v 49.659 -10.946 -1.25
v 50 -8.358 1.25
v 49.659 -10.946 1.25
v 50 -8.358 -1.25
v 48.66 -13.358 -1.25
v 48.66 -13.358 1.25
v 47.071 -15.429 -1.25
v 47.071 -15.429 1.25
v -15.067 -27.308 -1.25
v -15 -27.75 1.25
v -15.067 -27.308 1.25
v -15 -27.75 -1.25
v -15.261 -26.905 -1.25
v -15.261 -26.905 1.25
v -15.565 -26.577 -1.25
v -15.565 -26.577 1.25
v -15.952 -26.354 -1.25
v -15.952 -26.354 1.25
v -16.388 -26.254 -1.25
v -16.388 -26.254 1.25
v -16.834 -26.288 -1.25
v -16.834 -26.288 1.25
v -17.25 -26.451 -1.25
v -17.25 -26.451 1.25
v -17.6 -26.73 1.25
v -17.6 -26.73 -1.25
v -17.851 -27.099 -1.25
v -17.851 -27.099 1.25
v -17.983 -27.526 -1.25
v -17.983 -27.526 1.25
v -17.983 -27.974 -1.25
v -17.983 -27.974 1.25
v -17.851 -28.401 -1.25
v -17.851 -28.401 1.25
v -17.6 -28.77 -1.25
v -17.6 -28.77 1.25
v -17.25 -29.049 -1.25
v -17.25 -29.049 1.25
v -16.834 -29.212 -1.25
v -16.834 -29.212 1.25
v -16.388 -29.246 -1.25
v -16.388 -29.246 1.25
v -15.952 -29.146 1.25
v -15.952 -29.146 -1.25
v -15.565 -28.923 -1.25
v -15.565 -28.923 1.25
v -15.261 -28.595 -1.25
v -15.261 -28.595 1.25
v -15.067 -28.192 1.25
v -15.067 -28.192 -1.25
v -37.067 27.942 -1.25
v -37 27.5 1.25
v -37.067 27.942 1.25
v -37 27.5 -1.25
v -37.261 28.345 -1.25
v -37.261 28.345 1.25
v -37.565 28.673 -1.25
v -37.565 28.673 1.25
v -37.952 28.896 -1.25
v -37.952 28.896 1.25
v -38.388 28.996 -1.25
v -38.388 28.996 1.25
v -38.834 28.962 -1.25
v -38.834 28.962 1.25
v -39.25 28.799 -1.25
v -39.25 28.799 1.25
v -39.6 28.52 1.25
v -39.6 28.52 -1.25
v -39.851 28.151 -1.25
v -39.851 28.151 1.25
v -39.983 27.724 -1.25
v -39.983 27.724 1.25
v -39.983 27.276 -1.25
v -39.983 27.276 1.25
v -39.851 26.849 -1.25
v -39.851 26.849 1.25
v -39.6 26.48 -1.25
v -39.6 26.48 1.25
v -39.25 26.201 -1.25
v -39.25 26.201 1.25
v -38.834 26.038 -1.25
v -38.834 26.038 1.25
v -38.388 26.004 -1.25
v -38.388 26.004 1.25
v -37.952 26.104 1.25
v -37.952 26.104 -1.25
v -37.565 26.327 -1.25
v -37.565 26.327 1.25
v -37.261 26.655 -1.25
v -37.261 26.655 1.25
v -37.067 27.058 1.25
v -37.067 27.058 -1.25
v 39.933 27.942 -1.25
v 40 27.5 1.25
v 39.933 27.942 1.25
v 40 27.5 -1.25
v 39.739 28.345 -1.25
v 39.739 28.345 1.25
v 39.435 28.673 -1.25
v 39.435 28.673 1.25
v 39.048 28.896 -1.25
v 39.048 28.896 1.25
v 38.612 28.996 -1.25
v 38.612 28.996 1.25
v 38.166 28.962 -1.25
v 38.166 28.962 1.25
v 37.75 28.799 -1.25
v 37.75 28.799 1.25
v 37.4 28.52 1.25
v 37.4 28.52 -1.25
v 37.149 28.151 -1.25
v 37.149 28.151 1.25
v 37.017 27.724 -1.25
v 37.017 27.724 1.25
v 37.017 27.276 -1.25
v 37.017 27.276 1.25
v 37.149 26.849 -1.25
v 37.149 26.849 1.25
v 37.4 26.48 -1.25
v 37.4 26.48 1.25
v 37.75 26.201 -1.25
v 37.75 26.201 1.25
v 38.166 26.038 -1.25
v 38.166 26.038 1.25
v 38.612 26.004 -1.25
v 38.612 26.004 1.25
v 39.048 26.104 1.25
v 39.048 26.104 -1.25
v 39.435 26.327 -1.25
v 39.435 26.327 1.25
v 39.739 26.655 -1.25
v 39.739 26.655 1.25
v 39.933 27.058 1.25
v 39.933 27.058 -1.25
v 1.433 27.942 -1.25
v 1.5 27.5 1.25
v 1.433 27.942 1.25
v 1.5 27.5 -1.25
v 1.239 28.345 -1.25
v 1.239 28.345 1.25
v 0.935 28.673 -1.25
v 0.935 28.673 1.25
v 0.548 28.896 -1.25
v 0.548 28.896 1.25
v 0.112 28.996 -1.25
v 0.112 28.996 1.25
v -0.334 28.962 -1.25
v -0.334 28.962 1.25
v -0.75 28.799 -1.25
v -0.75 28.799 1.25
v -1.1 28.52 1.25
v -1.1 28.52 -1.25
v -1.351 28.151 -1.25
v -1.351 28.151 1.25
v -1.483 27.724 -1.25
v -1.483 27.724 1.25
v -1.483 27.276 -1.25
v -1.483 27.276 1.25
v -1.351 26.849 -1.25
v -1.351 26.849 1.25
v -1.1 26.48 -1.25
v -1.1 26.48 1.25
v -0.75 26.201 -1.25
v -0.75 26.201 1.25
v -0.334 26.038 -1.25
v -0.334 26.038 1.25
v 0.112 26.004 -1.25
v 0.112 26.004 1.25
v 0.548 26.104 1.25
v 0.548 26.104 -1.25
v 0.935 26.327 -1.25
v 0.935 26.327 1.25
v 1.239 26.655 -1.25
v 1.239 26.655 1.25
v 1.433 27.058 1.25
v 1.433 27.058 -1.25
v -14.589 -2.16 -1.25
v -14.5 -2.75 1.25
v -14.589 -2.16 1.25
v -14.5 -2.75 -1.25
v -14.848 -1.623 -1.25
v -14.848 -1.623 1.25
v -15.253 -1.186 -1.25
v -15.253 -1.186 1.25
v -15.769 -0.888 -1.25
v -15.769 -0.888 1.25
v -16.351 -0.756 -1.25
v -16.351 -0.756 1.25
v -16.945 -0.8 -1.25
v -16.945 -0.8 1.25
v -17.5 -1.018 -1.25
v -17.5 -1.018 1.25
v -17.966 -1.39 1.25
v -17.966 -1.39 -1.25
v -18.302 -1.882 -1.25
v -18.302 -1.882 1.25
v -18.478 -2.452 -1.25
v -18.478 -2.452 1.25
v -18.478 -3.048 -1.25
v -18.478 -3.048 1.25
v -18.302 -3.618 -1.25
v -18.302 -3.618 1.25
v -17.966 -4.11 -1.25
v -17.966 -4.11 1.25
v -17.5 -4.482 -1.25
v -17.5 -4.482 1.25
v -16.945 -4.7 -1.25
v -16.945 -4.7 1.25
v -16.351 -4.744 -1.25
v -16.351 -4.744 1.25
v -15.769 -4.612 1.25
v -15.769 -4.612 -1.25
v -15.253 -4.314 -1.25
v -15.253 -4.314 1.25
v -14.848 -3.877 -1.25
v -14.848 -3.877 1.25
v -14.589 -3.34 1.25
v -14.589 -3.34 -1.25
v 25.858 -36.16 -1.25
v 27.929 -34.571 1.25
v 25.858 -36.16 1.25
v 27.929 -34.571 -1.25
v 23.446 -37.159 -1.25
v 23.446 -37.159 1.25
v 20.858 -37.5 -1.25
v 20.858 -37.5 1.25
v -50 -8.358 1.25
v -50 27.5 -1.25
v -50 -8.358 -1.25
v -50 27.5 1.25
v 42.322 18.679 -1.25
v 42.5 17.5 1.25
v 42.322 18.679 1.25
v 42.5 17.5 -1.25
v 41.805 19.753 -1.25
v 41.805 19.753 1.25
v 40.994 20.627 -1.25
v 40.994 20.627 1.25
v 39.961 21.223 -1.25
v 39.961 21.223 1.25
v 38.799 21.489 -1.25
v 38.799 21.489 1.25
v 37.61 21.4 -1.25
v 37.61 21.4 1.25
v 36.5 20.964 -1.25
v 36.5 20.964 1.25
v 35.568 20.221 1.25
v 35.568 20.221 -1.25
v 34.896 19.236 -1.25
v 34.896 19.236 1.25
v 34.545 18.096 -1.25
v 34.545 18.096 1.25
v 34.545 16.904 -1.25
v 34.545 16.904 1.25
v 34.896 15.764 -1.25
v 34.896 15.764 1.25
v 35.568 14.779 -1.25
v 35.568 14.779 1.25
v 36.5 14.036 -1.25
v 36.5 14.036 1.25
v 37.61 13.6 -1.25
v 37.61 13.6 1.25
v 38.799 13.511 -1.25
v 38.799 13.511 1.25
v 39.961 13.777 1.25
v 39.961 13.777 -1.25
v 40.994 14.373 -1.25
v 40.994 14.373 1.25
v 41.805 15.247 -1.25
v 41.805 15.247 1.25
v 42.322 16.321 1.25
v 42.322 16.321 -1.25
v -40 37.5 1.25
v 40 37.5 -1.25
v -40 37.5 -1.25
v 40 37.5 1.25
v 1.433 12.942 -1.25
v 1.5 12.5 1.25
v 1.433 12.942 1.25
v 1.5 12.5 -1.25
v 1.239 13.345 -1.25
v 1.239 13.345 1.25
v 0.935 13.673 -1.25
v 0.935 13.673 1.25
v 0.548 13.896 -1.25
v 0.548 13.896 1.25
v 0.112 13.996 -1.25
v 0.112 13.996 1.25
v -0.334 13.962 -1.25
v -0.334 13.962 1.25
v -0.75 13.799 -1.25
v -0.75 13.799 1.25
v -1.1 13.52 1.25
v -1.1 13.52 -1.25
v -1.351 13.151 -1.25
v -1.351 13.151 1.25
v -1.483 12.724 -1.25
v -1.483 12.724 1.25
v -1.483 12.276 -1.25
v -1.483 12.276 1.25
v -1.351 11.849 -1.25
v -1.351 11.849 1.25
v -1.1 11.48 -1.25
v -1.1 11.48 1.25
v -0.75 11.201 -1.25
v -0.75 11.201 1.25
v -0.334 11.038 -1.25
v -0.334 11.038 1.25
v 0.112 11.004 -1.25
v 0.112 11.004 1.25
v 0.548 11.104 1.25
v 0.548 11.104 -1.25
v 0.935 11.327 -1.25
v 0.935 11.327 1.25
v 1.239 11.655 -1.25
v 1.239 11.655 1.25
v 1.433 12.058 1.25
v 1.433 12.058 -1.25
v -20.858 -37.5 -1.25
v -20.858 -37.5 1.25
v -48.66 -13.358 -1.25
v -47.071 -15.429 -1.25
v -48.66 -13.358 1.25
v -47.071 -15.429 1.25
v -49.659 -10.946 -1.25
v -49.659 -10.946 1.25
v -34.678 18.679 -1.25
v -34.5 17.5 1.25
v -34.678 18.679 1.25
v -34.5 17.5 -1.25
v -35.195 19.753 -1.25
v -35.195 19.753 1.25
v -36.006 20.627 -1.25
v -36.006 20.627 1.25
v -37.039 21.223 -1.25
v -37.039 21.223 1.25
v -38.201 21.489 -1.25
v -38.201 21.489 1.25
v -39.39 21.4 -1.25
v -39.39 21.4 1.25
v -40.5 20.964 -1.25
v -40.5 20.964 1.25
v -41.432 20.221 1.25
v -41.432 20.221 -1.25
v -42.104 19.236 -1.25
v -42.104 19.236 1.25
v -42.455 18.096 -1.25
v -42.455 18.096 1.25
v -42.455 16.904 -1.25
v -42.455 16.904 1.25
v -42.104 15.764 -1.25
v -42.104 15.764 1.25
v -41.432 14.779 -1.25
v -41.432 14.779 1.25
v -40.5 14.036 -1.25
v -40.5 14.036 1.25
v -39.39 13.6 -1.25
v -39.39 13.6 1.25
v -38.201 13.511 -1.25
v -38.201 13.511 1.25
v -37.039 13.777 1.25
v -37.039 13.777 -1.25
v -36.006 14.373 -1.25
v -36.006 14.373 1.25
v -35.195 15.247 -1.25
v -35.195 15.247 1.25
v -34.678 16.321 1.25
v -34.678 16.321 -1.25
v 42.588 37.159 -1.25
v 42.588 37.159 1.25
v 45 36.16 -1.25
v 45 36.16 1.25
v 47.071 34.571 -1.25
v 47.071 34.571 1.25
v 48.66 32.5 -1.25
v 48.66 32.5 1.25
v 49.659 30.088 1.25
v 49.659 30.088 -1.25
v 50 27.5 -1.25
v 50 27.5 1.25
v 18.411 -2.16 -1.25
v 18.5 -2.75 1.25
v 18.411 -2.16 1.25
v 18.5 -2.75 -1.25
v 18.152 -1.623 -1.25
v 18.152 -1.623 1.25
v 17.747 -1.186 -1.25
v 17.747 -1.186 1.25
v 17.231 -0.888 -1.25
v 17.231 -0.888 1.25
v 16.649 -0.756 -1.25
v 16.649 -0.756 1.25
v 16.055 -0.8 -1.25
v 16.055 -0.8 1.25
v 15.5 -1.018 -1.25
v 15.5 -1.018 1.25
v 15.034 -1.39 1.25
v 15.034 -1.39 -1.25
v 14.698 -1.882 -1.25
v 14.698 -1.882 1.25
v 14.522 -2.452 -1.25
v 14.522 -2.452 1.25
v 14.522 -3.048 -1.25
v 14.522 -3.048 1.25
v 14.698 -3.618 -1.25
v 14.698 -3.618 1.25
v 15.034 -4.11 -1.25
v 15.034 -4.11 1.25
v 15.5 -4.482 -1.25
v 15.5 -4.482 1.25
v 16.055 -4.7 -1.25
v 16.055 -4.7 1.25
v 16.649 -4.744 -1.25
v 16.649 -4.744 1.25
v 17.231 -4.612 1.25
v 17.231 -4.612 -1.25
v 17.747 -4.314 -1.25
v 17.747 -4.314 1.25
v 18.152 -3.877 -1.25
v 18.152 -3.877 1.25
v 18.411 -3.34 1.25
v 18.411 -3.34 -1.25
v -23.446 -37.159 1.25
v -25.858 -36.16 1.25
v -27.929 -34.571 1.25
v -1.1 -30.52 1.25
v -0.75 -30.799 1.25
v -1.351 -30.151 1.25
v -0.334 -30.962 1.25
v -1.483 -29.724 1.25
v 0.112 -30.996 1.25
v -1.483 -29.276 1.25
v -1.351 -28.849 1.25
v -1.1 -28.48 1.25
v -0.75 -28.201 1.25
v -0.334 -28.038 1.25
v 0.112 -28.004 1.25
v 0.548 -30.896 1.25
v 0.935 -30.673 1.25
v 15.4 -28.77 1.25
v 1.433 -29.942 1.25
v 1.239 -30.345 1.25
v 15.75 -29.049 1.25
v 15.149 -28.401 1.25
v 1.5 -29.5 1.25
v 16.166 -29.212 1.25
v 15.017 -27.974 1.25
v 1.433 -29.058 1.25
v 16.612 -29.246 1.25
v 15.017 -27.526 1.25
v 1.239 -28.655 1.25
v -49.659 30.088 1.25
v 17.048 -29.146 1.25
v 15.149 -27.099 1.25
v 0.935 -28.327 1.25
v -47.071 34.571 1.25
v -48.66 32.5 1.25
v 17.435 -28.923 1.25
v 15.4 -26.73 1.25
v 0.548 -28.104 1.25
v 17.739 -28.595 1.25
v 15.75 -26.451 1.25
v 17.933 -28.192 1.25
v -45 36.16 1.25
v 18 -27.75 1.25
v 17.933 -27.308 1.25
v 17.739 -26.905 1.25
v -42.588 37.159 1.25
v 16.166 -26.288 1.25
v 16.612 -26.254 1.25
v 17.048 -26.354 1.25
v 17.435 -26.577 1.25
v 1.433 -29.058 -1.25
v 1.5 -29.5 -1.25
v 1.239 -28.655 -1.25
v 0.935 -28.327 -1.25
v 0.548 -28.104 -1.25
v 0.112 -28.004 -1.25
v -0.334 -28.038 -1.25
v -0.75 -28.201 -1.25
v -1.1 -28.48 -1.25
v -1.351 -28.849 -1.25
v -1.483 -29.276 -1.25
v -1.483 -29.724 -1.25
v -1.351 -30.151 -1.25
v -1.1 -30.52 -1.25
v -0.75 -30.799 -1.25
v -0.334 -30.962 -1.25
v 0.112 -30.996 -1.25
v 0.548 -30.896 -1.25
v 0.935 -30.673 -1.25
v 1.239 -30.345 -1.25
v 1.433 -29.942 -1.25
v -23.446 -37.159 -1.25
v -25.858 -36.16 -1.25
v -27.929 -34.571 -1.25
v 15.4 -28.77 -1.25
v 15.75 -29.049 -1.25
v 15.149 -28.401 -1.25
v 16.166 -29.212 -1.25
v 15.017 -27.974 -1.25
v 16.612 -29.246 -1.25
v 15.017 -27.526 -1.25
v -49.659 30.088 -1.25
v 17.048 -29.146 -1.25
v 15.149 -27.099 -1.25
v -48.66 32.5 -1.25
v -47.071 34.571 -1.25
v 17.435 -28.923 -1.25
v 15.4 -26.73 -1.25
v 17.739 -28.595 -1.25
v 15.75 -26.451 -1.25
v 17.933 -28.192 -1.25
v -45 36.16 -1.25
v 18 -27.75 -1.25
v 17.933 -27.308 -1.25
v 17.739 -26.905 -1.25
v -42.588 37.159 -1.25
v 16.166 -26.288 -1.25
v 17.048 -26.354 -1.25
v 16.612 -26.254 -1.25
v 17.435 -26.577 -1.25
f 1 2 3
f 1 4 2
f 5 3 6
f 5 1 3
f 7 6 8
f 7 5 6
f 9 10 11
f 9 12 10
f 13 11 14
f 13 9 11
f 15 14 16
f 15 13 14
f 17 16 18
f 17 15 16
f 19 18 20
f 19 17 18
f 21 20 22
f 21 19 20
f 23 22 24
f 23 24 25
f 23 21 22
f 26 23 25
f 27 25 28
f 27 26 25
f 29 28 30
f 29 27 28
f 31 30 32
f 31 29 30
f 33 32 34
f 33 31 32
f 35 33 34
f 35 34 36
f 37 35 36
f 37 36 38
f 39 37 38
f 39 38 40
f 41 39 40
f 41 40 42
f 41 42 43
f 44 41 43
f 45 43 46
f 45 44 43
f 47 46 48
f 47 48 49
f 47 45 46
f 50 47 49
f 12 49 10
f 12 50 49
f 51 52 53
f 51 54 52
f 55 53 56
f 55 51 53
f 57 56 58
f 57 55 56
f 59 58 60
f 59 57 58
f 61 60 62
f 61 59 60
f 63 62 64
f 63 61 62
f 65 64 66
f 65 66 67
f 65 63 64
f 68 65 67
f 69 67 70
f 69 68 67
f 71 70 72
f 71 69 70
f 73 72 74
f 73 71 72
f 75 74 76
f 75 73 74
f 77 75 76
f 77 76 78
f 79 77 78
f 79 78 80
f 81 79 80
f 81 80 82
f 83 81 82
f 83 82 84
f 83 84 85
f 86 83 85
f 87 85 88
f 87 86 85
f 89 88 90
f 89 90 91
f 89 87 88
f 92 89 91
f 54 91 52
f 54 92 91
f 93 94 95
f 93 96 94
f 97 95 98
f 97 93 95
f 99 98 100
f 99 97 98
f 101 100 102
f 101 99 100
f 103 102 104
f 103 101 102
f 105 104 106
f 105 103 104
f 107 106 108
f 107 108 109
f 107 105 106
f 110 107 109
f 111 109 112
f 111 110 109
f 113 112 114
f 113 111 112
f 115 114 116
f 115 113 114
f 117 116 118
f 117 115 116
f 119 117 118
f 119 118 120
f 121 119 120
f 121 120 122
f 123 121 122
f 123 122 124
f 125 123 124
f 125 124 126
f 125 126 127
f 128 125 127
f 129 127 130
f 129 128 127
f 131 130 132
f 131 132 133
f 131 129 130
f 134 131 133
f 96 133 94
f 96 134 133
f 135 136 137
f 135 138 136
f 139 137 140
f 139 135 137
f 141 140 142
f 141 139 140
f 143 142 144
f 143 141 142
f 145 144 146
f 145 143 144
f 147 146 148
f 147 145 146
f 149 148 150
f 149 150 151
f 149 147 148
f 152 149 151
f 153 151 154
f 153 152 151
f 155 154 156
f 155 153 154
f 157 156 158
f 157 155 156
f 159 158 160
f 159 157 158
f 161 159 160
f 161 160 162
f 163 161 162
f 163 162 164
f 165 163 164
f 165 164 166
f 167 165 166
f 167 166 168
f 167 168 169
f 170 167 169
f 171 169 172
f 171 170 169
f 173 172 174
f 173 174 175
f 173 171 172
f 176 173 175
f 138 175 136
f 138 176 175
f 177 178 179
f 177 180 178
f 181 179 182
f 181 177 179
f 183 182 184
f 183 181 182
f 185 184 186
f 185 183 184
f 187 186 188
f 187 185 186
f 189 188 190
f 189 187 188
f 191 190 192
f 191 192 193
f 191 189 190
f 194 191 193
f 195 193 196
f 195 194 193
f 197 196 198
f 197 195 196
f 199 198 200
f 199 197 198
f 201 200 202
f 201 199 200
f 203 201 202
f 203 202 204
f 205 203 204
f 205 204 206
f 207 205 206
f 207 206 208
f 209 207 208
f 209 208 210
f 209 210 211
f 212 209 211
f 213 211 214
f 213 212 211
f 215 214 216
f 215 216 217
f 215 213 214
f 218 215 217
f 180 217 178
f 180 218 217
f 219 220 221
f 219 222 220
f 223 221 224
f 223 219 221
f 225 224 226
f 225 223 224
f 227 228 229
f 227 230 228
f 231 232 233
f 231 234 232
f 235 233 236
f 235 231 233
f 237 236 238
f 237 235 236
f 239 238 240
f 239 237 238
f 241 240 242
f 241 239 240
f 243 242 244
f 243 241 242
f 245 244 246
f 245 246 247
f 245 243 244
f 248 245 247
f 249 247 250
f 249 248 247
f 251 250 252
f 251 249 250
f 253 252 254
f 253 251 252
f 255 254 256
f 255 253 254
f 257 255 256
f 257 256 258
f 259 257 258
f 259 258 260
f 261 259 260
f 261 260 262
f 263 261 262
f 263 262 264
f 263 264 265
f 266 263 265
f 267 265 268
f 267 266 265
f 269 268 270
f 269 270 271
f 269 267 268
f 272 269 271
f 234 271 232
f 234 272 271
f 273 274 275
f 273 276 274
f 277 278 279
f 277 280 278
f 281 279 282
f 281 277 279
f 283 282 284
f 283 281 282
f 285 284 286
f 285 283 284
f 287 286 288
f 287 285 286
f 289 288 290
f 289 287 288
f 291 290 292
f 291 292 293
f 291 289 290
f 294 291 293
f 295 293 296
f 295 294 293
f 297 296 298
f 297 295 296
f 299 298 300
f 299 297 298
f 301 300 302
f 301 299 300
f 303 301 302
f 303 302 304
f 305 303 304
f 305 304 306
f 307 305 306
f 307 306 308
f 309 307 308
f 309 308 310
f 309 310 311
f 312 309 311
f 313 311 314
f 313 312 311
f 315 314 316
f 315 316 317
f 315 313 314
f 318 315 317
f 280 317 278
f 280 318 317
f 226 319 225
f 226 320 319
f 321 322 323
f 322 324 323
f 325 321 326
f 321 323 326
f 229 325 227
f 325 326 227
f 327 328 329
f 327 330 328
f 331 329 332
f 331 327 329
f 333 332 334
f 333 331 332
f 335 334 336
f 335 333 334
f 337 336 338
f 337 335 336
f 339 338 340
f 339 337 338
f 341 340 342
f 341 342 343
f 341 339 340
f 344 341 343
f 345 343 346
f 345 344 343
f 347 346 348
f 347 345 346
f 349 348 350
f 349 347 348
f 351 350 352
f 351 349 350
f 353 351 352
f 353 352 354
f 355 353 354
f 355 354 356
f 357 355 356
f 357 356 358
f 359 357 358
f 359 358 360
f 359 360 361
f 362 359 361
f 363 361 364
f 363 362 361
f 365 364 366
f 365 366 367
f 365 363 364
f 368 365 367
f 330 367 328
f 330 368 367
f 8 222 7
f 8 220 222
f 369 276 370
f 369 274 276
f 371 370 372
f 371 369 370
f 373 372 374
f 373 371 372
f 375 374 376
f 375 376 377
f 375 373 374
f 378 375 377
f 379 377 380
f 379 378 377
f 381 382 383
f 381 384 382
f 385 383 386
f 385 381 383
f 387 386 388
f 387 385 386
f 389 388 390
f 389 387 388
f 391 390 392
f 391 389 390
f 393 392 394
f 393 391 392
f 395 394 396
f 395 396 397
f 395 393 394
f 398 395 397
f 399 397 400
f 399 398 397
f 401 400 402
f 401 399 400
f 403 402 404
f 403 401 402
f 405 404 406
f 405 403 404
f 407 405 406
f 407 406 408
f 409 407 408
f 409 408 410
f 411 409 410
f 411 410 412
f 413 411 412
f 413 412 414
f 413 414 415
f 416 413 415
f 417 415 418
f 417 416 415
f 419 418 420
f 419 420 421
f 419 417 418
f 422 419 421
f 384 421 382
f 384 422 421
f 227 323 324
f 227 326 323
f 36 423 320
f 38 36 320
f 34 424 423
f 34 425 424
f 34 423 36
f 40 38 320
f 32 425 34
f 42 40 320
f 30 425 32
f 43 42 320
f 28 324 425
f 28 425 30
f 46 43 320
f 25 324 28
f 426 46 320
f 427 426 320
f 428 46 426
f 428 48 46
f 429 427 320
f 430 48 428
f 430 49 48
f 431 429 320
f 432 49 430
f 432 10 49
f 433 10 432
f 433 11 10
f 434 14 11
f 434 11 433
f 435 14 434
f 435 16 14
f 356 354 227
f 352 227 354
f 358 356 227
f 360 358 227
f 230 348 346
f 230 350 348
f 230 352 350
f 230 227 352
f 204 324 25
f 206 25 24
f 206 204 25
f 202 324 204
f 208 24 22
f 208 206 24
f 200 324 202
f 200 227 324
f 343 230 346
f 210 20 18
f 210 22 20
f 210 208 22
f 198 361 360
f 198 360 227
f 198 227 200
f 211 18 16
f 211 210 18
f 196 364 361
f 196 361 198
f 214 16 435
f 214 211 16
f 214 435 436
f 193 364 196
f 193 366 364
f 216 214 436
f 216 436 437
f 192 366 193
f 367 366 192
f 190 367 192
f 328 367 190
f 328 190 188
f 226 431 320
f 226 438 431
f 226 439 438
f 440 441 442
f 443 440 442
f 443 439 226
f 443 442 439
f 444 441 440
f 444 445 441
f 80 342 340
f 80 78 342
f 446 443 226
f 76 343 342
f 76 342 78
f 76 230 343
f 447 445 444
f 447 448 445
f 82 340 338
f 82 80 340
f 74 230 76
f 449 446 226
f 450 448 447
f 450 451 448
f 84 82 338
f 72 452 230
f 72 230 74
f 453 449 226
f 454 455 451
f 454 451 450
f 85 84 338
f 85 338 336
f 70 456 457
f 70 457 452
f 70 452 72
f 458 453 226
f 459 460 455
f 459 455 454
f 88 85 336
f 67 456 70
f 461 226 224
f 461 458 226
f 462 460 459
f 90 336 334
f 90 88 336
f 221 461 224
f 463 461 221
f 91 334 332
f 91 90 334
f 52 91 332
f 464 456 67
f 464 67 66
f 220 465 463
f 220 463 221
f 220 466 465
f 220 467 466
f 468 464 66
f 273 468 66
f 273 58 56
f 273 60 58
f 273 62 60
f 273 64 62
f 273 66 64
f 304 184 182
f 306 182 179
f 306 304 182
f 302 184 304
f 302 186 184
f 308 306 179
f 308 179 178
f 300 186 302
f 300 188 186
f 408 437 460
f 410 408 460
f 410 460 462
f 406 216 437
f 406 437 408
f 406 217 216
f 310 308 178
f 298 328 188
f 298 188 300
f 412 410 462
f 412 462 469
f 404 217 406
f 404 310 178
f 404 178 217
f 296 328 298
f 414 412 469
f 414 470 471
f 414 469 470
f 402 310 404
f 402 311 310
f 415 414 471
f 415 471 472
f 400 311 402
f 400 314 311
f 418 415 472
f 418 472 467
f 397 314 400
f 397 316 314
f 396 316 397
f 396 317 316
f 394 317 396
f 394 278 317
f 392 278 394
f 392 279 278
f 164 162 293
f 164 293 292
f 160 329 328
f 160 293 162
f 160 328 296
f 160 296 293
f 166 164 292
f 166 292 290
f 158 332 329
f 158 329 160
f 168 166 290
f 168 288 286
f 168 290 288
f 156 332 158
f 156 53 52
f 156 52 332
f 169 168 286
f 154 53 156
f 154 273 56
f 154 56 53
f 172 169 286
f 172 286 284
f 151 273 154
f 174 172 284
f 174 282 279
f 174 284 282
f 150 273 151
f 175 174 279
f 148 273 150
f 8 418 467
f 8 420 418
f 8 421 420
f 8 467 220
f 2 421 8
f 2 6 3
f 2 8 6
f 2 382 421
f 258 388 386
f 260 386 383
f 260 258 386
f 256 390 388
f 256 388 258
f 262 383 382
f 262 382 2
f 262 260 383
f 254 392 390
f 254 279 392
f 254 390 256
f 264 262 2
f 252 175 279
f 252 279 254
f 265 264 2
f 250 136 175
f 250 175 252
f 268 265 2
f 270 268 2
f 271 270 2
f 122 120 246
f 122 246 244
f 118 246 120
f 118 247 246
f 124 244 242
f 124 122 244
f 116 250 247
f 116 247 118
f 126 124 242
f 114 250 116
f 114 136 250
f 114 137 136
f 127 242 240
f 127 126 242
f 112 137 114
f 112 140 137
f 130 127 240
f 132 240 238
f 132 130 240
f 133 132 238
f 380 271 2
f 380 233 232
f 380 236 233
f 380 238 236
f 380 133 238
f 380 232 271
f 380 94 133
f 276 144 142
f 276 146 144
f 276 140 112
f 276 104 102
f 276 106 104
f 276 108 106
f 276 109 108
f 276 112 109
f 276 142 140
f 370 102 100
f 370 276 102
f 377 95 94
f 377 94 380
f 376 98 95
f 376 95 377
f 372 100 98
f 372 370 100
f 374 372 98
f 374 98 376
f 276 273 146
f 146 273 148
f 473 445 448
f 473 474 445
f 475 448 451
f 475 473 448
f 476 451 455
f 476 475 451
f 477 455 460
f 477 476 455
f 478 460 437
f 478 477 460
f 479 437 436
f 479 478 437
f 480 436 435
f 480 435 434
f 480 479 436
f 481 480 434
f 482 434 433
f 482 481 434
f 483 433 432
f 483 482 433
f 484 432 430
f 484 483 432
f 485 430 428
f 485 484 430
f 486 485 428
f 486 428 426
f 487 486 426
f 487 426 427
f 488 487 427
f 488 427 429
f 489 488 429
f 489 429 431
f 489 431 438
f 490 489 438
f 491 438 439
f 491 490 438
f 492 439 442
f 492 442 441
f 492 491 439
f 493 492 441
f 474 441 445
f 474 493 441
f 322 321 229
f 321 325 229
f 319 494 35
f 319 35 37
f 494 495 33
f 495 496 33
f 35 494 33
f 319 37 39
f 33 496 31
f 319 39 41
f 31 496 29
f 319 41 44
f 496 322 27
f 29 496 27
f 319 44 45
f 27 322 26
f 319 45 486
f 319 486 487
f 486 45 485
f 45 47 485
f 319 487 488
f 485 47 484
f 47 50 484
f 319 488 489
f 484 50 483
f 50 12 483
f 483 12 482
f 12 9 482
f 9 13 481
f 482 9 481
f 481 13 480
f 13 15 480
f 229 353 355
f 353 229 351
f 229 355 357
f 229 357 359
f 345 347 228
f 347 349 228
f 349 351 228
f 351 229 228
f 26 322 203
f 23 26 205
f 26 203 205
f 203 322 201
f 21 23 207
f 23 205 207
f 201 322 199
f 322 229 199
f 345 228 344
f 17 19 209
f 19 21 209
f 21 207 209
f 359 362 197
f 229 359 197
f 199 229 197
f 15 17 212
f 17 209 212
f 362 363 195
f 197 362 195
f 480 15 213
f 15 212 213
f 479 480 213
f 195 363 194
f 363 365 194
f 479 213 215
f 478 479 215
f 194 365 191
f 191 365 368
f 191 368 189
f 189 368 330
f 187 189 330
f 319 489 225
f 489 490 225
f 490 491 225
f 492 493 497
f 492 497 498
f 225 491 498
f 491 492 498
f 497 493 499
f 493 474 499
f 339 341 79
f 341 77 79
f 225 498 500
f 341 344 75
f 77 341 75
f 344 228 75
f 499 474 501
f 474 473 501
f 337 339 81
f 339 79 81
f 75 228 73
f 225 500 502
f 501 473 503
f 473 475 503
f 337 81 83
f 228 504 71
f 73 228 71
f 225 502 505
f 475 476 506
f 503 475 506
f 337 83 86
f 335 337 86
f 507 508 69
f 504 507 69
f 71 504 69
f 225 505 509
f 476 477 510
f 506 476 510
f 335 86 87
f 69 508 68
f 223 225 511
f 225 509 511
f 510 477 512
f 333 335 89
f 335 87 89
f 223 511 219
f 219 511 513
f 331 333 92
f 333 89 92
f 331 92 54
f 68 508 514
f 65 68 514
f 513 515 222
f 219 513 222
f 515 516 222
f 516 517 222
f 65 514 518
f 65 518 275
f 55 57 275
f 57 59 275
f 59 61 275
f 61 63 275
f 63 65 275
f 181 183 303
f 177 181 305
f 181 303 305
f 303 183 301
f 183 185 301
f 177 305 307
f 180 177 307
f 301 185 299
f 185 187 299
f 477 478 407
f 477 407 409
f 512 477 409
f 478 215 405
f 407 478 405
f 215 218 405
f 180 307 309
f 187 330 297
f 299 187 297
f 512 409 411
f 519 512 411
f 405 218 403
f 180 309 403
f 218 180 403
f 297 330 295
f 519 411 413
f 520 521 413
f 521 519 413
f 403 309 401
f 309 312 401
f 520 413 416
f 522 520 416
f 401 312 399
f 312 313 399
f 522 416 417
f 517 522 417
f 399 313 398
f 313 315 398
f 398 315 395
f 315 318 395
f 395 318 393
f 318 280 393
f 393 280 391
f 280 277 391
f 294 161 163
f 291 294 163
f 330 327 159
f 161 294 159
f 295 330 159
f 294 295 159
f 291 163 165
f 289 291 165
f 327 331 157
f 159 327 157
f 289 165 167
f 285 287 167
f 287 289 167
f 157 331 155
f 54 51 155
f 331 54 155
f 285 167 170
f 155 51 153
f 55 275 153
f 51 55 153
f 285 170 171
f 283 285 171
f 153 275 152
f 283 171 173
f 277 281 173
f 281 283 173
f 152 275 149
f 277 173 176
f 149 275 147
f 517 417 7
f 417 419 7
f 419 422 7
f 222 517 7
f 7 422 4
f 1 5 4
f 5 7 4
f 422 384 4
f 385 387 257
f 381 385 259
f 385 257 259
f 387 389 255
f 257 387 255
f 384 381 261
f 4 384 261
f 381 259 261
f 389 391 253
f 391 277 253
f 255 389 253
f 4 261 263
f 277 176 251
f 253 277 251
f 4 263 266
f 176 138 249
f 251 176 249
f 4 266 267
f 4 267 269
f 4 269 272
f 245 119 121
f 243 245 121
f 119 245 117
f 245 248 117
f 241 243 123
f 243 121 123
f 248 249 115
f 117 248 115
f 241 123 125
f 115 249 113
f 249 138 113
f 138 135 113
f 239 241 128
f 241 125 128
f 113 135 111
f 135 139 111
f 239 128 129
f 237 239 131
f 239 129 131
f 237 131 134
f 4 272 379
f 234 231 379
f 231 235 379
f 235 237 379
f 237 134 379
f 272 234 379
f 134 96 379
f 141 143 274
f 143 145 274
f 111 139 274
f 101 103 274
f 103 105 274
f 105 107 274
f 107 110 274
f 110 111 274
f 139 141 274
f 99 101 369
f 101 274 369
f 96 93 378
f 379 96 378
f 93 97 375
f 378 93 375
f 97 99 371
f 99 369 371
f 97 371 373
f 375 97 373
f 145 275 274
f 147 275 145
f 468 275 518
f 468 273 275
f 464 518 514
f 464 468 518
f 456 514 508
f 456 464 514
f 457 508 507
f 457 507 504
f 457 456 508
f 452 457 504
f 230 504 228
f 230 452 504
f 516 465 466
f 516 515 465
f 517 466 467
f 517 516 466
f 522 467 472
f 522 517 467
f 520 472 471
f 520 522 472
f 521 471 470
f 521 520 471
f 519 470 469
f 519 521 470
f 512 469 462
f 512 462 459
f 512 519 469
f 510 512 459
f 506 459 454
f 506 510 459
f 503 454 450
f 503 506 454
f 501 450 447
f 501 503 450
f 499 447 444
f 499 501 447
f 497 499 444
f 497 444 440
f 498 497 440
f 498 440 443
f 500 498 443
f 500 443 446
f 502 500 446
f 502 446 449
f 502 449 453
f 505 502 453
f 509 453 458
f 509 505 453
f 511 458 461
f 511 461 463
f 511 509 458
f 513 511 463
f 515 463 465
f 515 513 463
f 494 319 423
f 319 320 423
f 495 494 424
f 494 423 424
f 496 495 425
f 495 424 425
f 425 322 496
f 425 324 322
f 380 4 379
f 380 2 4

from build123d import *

# Parameters (mm, degrees)
SKETCH1_3_R         = 1.5
SKETCH1_3_R_2       = 2
SKETCH1_3_R_3       = 4
BOSS_EXTRUDE2_DEPTH = 1.25
FILLET2_R           = 10


with BuildPart() as part:
    # Sketch1<3> → Boss-Extrude2 (new, symmetric)
    with BuildSketch(Plane.XY):
        Polygon((50, -12.5), (50, 37.5), (-50, 37.5), (-50, -12.5), (-25, -37.5), (25, -37.5), align=None)
        with Locations((-16.5, -27.75)):
            Circle(SKETCH1_3_R, mode=Mode.SUBTRACT)
        with Locations((0, -29.5)):
            Circle(SKETCH1_3_R, mode=Mode.SUBTRACT)
        with Locations((16.5, -27.75)):
            Circle(SKETCH1_3_R, mode=Mode.SUBTRACT)
        with Locations((16.5, -2.75)):
            Circle(SKETCH1_3_R_2, mode=Mode.SUBTRACT)
        with Locations((-38.5, 17.5)):
            Circle(SKETCH1_3_R_3, mode=Mode.SUBTRACT)
        with Locations((-38.5, 27.5)):
            Circle(SKETCH1_3_R, mode=Mode.SUBTRACT)
        with Locations((0, 12.5)):
            Circle(SKETCH1_3_R, mode=Mode.SUBTRACT)
        with Locations((38.5, 17.5)):
            Circle(SKETCH1_3_R_3, mode=Mode.SUBTRACT)
        with Locations((0, 27.5)):
            Circle(SKETCH1_3_R, mode=Mode.SUBTRACT)
        with Locations((38.5, 27.5)):
            Circle(SKETCH1_3_R, mode=Mode.SUBTRACT)
        with Locations((-16.5, -2.75)):
            Circle(SKETCH1_3_R_2, mode=Mode.SUBTRACT)
    extrude(amount=BOSS_EXTRUDE2_DEPTH, both=True)

    # Fillet2
    fillet2_edges = [part.edges().sort_by_distance(p)[0] for p in [
        (50, -12.5, 0),
        (25, -37.5, 0),
        (-25, -37.5, 0),
        (-50, -12.5, 0),
        (-50, 37.5, 0),
        (50, 37.5, 0),
    ]]
    fillet(fillet2_edges, radius=FILLET2_R)


solid = part.part
